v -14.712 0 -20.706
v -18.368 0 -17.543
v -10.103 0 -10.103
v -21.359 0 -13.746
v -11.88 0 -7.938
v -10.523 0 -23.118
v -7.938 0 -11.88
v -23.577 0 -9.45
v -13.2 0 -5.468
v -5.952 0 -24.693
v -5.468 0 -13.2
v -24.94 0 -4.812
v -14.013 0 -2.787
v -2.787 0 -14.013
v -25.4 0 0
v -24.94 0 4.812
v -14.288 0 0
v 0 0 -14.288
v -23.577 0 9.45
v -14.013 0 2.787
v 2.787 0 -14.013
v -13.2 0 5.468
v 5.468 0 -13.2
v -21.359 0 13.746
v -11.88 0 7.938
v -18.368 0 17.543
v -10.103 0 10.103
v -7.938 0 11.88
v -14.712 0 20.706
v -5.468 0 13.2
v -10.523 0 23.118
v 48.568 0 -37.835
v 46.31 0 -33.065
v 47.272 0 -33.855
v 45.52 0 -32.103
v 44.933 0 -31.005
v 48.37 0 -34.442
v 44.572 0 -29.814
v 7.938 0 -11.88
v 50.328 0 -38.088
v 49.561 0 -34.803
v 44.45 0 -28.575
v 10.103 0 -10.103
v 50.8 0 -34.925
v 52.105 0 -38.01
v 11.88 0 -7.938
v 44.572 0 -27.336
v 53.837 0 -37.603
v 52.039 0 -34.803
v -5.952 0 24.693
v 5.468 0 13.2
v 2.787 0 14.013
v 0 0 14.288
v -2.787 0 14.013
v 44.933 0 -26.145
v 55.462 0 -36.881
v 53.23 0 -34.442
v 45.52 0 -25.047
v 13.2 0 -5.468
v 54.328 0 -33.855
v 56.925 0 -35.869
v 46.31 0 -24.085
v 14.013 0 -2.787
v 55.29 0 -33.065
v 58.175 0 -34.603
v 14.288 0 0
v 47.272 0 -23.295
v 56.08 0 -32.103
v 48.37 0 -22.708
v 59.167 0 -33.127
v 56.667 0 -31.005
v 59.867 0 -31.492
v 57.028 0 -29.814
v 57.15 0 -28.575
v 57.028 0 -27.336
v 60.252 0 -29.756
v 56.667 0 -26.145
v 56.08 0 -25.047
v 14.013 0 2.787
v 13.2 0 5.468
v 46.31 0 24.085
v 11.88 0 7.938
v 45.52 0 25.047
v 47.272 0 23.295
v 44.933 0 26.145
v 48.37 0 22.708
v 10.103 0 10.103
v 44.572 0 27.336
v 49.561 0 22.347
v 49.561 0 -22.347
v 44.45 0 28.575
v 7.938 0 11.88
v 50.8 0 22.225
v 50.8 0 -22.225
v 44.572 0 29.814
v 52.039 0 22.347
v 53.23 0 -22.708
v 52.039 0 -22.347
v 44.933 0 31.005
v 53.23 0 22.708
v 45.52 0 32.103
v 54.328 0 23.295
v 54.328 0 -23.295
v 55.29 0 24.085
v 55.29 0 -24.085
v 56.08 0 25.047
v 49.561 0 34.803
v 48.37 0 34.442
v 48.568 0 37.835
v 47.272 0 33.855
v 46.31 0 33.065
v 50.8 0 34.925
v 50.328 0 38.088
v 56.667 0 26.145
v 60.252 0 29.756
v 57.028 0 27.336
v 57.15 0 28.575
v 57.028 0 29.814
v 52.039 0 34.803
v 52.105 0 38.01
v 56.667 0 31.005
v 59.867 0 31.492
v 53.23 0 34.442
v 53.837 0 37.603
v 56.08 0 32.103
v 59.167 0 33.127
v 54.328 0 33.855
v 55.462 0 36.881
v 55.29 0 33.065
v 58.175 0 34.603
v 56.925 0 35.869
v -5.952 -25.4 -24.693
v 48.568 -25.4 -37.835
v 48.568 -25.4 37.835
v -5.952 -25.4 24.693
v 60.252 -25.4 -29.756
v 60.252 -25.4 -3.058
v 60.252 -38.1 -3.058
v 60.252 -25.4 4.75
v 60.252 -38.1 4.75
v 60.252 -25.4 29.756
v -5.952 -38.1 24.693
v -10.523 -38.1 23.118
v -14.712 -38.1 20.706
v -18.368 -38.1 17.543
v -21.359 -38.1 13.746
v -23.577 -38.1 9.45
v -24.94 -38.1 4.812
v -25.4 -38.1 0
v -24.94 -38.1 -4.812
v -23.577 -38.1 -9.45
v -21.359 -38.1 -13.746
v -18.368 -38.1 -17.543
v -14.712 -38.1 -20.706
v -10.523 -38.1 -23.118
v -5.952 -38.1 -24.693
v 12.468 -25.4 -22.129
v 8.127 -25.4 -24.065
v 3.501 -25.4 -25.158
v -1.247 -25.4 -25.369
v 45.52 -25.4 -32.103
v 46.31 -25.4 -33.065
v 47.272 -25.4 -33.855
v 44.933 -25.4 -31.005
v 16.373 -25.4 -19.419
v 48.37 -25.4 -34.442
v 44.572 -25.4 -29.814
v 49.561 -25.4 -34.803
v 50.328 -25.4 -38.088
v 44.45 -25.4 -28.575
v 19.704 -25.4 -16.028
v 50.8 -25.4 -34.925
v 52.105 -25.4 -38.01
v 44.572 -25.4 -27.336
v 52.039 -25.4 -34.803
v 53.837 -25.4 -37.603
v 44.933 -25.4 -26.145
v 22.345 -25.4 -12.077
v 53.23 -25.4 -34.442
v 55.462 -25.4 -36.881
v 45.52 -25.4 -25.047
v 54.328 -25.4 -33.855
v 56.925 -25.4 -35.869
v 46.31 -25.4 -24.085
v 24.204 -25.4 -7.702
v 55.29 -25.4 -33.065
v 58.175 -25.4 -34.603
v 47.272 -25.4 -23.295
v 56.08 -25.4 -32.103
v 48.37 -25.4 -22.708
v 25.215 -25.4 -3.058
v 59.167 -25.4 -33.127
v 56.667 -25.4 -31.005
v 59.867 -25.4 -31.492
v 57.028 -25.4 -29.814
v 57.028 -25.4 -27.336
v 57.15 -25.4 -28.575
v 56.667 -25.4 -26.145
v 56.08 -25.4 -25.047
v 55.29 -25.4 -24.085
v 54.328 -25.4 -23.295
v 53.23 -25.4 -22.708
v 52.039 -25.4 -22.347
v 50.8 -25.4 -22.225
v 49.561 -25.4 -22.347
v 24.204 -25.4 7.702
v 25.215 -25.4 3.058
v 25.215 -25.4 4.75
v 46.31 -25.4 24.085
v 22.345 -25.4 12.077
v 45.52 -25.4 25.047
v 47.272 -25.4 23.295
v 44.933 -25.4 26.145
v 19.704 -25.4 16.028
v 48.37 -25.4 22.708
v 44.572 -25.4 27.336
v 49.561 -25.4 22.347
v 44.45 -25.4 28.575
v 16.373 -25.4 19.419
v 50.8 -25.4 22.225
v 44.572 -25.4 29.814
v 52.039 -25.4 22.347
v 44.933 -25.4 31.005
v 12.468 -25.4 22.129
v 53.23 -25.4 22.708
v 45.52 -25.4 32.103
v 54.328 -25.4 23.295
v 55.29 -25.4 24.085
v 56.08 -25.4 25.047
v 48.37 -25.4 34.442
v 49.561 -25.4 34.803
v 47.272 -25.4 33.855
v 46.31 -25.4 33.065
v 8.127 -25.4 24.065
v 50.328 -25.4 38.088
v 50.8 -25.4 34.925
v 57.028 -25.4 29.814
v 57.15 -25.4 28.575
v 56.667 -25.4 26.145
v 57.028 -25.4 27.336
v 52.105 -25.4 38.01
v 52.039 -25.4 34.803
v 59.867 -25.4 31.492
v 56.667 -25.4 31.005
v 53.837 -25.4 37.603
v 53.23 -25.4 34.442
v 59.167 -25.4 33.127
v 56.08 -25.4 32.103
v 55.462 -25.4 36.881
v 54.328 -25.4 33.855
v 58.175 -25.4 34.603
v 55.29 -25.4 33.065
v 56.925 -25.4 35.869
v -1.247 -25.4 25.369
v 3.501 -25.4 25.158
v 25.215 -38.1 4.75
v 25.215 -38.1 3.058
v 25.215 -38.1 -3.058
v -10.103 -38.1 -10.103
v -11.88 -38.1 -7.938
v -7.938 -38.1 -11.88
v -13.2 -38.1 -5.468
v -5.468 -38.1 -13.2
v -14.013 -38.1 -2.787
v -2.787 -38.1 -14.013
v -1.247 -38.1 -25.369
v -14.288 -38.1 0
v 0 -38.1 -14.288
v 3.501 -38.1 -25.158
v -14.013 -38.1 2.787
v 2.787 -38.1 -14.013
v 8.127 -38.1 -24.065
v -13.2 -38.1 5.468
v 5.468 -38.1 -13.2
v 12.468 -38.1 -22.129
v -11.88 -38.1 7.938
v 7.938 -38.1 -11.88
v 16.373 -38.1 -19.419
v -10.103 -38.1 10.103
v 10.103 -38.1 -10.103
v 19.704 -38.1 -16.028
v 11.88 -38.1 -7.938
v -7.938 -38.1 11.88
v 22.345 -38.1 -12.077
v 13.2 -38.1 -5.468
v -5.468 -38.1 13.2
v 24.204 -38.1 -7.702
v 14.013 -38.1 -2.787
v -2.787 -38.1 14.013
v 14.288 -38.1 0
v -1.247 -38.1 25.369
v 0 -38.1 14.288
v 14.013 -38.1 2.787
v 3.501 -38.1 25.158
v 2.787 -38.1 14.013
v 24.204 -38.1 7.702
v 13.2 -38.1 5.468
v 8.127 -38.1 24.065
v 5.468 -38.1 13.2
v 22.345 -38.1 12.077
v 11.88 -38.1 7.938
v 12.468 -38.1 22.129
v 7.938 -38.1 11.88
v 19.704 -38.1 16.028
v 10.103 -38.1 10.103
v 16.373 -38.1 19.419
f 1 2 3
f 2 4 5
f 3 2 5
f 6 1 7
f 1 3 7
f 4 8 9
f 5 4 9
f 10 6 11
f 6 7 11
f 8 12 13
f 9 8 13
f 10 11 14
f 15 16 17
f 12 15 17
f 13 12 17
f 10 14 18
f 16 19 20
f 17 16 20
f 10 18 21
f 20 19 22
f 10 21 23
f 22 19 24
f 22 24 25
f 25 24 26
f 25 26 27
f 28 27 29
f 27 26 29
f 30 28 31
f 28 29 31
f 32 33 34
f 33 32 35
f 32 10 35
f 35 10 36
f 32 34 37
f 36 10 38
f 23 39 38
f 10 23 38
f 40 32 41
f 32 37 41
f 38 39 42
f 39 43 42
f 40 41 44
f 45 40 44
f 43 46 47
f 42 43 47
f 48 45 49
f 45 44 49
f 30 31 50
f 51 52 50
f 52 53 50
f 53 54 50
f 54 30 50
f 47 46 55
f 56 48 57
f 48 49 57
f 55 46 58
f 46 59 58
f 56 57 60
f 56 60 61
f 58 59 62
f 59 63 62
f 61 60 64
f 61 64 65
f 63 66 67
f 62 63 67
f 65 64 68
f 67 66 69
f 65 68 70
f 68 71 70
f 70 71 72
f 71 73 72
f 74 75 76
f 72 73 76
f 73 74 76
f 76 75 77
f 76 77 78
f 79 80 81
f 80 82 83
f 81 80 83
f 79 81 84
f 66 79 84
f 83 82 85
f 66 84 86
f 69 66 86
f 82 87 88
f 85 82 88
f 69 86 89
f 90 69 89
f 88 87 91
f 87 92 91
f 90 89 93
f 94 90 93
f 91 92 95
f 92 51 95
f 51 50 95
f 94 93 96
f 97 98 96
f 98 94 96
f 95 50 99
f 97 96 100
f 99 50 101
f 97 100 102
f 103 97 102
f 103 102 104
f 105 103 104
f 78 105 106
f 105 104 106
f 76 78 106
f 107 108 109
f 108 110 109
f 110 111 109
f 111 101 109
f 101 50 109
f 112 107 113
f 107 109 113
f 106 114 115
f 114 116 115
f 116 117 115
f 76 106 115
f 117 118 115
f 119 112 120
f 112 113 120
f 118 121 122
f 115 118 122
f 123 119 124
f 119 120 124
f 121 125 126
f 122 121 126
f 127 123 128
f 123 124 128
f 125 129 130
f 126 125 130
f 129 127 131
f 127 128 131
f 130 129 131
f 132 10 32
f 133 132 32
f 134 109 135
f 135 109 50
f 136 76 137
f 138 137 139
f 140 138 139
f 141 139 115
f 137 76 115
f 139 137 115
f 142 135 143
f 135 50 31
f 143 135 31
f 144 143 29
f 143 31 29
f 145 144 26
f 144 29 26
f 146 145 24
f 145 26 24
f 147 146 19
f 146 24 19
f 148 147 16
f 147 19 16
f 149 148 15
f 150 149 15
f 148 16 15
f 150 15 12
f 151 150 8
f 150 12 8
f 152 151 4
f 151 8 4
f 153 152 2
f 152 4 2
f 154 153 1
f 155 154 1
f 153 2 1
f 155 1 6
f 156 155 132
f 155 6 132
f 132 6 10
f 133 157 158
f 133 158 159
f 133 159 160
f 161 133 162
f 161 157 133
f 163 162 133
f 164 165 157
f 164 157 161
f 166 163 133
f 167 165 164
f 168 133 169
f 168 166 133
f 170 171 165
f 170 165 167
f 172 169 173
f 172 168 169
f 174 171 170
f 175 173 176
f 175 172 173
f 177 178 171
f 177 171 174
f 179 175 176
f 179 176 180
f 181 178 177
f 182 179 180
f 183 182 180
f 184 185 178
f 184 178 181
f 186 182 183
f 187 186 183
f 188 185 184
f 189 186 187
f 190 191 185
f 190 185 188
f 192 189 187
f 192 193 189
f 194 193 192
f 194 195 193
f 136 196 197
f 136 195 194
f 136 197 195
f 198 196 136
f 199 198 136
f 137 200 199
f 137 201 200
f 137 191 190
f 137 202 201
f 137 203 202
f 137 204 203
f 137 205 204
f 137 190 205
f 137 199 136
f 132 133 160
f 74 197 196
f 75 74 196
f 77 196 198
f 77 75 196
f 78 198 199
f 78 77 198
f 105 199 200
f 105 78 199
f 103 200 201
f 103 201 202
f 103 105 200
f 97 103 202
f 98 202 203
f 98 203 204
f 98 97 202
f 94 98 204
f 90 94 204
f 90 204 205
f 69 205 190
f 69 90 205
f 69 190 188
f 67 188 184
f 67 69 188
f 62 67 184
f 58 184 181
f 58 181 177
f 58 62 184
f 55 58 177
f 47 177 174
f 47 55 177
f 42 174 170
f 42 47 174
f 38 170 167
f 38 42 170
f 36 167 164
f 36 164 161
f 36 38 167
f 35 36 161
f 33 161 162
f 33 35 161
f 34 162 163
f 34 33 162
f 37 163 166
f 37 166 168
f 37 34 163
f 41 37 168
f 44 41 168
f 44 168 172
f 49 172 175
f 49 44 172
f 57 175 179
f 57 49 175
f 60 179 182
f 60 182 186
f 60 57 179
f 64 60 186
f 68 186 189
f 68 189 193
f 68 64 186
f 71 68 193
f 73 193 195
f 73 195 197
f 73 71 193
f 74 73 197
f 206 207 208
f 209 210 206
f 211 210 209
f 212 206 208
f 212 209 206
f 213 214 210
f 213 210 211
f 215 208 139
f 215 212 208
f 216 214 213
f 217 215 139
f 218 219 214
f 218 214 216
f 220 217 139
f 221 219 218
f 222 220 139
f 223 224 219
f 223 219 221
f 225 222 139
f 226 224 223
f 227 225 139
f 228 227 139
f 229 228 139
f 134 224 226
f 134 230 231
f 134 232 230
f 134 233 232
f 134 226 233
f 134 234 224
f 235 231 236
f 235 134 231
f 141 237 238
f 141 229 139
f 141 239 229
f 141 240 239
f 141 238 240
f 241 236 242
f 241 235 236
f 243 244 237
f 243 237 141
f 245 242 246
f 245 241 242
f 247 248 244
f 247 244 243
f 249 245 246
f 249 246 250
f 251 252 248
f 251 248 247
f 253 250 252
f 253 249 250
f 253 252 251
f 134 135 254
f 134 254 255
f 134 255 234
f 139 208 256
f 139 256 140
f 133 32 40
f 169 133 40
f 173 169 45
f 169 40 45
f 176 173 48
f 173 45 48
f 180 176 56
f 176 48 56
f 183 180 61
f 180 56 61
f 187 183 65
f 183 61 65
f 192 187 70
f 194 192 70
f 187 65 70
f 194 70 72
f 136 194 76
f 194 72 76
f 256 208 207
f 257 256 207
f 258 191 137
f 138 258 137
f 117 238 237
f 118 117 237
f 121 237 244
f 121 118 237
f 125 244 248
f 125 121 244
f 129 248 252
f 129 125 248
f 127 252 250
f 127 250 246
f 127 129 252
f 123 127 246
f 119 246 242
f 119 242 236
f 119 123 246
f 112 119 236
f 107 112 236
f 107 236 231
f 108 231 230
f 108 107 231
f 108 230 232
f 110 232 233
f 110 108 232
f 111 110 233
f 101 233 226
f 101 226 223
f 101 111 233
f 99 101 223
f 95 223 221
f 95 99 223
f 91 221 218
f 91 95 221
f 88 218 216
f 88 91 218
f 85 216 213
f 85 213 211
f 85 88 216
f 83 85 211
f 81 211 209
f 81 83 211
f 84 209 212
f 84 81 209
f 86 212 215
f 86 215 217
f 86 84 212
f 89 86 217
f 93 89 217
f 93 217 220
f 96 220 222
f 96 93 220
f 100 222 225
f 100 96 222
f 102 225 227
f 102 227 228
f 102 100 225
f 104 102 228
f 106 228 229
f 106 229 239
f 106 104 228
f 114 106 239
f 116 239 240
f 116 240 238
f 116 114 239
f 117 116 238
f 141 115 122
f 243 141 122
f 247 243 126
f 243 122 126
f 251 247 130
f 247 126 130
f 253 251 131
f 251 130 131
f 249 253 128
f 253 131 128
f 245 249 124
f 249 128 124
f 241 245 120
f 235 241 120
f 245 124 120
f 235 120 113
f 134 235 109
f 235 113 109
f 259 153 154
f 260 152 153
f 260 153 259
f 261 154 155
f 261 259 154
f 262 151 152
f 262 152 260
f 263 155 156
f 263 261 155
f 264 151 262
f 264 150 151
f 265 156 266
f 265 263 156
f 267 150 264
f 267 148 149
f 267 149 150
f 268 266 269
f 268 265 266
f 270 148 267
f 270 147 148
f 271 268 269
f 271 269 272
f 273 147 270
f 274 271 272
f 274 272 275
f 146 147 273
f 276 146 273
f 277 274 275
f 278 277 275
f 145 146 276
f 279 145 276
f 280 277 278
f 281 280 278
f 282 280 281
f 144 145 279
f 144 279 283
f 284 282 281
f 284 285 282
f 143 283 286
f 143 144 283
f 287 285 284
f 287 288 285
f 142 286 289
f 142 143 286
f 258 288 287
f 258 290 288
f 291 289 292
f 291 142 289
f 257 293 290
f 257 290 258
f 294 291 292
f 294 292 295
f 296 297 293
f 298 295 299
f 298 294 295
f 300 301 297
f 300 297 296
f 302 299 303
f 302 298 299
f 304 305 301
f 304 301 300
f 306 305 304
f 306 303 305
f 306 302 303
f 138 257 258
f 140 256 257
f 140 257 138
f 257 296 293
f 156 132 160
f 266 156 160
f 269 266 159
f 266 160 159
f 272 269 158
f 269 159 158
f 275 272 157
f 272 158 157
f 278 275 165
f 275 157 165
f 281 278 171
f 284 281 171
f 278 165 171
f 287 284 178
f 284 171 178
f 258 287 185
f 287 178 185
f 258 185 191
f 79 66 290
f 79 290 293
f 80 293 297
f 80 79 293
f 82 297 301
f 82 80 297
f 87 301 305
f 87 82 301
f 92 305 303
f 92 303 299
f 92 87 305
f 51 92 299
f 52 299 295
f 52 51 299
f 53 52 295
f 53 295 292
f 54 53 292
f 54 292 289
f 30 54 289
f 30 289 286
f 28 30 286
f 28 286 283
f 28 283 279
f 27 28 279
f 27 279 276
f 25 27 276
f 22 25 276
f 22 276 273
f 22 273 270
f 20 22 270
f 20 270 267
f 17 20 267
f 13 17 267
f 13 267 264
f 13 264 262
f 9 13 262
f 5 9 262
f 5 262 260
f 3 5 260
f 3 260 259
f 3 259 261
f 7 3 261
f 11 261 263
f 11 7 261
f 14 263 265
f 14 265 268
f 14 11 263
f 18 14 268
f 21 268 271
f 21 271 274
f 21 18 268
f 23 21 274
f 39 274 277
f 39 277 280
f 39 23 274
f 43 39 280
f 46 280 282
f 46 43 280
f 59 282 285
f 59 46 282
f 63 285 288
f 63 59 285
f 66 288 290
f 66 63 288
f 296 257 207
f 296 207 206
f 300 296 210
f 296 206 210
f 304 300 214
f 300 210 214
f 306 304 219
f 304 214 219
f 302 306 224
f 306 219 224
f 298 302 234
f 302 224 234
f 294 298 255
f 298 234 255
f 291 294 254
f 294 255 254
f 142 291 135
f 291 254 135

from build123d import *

# Parameters (mm, degrees)
F0_R     = 6.35
F0_R_2   = 14.2875
F1_DEPTH = 25.4
F2_DEPTH = 38.1
F3_W     = 35.03626
F3_H     = 7.807383
F4_DEPTH = 12.7


with BuildPart() as f1:
    # F0 (on Front) → F1 (new body)
    with BuildSketch(Plane.XZ):
        with BuildLine():
            ThreePointArc((-5.952169, 24.692745), (15.715834, 19.954261), (25.4, 0))
            ThreePointArc((25.4, 0), (15.715834, -19.954261), (-5.952169, -24.692745))
            Line((-5.952169, -24.692745), (48.567936, -37.83478))
            ThreePointArc((48.567936, -37.83478), (56.217416, -36.409362), (60.251547, -29.755632))
            Line((60.251547, -29.755632), (60.251547, 27.394368))
            Line((60.251547, 27.394368), (60.251547, 29.755632))
            ThreePointArc((60.251547, 29.755632), (56.217416, 36.409362), (48.567936, 37.83478))
            Line((48.567936, 37.83478), (-5.952169, 24.692745))
        make_face()
        with Locations((50.8, -28.575)):
            Circle(F0_R, mode=Mode.SUBTRACT)
        with Locations((50.8, 28.575)):
            Circle(F0_R, mode=Mode.SUBTRACT)
        with BuildLine():
            ThreePointArc((-5.952169, -24.692745), (15.715834, -19.954261), (25.4, 0))
            ThreePointArc((25.4, 0), (15.715834, 19.954261), (-5.952169, 24.692745))
            ThreePointArc((-5.952169, 24.692745), (-25.4, 0), (-5.952169, -24.692745))
        make_face()
        Circle(F0_R_2, mode=Mode.SUBTRACT)
    extrude(amount=F1_DEPTH)

    # F0 (on Front) → F2 (join)
    with BuildSketch(Plane.XZ):
        with BuildLine():
            ThreePointArc((-5.952169, -24.692745), (15.715834, -19.954261), (25.4, 0))
            ThreePointArc((25.4, 0), (15.715834, 19.954261), (-5.952169, 24.692745))
            ThreePointArc((-5.952169, 24.692745), (-25.4, 0), (-5.952169, -24.692745))
        make_face()
        Circle(F0_R_2, mode=Mode.SUBTRACT)
    extrude(amount=F2_DEPTH)

    # F3 (on face) → F4 (join)
    with BuildSketch(Plane.XZ.offset(25.4)):
        with Locations((42.733417, 0.846031)):
            Rectangle(F3_W, F3_H)
        with BuildLine():
            Line((60.251547, -3.057661), (60.251547, 4.749722))
            Line((60.251547, 4.749722), (25.215287, 4.749722))
            Line((25.215287, 4.749722), (25.215287, 3.057661))
            ThreePointArc((25.215287, 3.057661), (25.4, 0), (25.215287, -3.057661))
            Line((25.215287, -3.057661), (60.251547, -3.057661))
        make_face()
    extrude(amount=F4_DEPTH)


solid = f1.part
